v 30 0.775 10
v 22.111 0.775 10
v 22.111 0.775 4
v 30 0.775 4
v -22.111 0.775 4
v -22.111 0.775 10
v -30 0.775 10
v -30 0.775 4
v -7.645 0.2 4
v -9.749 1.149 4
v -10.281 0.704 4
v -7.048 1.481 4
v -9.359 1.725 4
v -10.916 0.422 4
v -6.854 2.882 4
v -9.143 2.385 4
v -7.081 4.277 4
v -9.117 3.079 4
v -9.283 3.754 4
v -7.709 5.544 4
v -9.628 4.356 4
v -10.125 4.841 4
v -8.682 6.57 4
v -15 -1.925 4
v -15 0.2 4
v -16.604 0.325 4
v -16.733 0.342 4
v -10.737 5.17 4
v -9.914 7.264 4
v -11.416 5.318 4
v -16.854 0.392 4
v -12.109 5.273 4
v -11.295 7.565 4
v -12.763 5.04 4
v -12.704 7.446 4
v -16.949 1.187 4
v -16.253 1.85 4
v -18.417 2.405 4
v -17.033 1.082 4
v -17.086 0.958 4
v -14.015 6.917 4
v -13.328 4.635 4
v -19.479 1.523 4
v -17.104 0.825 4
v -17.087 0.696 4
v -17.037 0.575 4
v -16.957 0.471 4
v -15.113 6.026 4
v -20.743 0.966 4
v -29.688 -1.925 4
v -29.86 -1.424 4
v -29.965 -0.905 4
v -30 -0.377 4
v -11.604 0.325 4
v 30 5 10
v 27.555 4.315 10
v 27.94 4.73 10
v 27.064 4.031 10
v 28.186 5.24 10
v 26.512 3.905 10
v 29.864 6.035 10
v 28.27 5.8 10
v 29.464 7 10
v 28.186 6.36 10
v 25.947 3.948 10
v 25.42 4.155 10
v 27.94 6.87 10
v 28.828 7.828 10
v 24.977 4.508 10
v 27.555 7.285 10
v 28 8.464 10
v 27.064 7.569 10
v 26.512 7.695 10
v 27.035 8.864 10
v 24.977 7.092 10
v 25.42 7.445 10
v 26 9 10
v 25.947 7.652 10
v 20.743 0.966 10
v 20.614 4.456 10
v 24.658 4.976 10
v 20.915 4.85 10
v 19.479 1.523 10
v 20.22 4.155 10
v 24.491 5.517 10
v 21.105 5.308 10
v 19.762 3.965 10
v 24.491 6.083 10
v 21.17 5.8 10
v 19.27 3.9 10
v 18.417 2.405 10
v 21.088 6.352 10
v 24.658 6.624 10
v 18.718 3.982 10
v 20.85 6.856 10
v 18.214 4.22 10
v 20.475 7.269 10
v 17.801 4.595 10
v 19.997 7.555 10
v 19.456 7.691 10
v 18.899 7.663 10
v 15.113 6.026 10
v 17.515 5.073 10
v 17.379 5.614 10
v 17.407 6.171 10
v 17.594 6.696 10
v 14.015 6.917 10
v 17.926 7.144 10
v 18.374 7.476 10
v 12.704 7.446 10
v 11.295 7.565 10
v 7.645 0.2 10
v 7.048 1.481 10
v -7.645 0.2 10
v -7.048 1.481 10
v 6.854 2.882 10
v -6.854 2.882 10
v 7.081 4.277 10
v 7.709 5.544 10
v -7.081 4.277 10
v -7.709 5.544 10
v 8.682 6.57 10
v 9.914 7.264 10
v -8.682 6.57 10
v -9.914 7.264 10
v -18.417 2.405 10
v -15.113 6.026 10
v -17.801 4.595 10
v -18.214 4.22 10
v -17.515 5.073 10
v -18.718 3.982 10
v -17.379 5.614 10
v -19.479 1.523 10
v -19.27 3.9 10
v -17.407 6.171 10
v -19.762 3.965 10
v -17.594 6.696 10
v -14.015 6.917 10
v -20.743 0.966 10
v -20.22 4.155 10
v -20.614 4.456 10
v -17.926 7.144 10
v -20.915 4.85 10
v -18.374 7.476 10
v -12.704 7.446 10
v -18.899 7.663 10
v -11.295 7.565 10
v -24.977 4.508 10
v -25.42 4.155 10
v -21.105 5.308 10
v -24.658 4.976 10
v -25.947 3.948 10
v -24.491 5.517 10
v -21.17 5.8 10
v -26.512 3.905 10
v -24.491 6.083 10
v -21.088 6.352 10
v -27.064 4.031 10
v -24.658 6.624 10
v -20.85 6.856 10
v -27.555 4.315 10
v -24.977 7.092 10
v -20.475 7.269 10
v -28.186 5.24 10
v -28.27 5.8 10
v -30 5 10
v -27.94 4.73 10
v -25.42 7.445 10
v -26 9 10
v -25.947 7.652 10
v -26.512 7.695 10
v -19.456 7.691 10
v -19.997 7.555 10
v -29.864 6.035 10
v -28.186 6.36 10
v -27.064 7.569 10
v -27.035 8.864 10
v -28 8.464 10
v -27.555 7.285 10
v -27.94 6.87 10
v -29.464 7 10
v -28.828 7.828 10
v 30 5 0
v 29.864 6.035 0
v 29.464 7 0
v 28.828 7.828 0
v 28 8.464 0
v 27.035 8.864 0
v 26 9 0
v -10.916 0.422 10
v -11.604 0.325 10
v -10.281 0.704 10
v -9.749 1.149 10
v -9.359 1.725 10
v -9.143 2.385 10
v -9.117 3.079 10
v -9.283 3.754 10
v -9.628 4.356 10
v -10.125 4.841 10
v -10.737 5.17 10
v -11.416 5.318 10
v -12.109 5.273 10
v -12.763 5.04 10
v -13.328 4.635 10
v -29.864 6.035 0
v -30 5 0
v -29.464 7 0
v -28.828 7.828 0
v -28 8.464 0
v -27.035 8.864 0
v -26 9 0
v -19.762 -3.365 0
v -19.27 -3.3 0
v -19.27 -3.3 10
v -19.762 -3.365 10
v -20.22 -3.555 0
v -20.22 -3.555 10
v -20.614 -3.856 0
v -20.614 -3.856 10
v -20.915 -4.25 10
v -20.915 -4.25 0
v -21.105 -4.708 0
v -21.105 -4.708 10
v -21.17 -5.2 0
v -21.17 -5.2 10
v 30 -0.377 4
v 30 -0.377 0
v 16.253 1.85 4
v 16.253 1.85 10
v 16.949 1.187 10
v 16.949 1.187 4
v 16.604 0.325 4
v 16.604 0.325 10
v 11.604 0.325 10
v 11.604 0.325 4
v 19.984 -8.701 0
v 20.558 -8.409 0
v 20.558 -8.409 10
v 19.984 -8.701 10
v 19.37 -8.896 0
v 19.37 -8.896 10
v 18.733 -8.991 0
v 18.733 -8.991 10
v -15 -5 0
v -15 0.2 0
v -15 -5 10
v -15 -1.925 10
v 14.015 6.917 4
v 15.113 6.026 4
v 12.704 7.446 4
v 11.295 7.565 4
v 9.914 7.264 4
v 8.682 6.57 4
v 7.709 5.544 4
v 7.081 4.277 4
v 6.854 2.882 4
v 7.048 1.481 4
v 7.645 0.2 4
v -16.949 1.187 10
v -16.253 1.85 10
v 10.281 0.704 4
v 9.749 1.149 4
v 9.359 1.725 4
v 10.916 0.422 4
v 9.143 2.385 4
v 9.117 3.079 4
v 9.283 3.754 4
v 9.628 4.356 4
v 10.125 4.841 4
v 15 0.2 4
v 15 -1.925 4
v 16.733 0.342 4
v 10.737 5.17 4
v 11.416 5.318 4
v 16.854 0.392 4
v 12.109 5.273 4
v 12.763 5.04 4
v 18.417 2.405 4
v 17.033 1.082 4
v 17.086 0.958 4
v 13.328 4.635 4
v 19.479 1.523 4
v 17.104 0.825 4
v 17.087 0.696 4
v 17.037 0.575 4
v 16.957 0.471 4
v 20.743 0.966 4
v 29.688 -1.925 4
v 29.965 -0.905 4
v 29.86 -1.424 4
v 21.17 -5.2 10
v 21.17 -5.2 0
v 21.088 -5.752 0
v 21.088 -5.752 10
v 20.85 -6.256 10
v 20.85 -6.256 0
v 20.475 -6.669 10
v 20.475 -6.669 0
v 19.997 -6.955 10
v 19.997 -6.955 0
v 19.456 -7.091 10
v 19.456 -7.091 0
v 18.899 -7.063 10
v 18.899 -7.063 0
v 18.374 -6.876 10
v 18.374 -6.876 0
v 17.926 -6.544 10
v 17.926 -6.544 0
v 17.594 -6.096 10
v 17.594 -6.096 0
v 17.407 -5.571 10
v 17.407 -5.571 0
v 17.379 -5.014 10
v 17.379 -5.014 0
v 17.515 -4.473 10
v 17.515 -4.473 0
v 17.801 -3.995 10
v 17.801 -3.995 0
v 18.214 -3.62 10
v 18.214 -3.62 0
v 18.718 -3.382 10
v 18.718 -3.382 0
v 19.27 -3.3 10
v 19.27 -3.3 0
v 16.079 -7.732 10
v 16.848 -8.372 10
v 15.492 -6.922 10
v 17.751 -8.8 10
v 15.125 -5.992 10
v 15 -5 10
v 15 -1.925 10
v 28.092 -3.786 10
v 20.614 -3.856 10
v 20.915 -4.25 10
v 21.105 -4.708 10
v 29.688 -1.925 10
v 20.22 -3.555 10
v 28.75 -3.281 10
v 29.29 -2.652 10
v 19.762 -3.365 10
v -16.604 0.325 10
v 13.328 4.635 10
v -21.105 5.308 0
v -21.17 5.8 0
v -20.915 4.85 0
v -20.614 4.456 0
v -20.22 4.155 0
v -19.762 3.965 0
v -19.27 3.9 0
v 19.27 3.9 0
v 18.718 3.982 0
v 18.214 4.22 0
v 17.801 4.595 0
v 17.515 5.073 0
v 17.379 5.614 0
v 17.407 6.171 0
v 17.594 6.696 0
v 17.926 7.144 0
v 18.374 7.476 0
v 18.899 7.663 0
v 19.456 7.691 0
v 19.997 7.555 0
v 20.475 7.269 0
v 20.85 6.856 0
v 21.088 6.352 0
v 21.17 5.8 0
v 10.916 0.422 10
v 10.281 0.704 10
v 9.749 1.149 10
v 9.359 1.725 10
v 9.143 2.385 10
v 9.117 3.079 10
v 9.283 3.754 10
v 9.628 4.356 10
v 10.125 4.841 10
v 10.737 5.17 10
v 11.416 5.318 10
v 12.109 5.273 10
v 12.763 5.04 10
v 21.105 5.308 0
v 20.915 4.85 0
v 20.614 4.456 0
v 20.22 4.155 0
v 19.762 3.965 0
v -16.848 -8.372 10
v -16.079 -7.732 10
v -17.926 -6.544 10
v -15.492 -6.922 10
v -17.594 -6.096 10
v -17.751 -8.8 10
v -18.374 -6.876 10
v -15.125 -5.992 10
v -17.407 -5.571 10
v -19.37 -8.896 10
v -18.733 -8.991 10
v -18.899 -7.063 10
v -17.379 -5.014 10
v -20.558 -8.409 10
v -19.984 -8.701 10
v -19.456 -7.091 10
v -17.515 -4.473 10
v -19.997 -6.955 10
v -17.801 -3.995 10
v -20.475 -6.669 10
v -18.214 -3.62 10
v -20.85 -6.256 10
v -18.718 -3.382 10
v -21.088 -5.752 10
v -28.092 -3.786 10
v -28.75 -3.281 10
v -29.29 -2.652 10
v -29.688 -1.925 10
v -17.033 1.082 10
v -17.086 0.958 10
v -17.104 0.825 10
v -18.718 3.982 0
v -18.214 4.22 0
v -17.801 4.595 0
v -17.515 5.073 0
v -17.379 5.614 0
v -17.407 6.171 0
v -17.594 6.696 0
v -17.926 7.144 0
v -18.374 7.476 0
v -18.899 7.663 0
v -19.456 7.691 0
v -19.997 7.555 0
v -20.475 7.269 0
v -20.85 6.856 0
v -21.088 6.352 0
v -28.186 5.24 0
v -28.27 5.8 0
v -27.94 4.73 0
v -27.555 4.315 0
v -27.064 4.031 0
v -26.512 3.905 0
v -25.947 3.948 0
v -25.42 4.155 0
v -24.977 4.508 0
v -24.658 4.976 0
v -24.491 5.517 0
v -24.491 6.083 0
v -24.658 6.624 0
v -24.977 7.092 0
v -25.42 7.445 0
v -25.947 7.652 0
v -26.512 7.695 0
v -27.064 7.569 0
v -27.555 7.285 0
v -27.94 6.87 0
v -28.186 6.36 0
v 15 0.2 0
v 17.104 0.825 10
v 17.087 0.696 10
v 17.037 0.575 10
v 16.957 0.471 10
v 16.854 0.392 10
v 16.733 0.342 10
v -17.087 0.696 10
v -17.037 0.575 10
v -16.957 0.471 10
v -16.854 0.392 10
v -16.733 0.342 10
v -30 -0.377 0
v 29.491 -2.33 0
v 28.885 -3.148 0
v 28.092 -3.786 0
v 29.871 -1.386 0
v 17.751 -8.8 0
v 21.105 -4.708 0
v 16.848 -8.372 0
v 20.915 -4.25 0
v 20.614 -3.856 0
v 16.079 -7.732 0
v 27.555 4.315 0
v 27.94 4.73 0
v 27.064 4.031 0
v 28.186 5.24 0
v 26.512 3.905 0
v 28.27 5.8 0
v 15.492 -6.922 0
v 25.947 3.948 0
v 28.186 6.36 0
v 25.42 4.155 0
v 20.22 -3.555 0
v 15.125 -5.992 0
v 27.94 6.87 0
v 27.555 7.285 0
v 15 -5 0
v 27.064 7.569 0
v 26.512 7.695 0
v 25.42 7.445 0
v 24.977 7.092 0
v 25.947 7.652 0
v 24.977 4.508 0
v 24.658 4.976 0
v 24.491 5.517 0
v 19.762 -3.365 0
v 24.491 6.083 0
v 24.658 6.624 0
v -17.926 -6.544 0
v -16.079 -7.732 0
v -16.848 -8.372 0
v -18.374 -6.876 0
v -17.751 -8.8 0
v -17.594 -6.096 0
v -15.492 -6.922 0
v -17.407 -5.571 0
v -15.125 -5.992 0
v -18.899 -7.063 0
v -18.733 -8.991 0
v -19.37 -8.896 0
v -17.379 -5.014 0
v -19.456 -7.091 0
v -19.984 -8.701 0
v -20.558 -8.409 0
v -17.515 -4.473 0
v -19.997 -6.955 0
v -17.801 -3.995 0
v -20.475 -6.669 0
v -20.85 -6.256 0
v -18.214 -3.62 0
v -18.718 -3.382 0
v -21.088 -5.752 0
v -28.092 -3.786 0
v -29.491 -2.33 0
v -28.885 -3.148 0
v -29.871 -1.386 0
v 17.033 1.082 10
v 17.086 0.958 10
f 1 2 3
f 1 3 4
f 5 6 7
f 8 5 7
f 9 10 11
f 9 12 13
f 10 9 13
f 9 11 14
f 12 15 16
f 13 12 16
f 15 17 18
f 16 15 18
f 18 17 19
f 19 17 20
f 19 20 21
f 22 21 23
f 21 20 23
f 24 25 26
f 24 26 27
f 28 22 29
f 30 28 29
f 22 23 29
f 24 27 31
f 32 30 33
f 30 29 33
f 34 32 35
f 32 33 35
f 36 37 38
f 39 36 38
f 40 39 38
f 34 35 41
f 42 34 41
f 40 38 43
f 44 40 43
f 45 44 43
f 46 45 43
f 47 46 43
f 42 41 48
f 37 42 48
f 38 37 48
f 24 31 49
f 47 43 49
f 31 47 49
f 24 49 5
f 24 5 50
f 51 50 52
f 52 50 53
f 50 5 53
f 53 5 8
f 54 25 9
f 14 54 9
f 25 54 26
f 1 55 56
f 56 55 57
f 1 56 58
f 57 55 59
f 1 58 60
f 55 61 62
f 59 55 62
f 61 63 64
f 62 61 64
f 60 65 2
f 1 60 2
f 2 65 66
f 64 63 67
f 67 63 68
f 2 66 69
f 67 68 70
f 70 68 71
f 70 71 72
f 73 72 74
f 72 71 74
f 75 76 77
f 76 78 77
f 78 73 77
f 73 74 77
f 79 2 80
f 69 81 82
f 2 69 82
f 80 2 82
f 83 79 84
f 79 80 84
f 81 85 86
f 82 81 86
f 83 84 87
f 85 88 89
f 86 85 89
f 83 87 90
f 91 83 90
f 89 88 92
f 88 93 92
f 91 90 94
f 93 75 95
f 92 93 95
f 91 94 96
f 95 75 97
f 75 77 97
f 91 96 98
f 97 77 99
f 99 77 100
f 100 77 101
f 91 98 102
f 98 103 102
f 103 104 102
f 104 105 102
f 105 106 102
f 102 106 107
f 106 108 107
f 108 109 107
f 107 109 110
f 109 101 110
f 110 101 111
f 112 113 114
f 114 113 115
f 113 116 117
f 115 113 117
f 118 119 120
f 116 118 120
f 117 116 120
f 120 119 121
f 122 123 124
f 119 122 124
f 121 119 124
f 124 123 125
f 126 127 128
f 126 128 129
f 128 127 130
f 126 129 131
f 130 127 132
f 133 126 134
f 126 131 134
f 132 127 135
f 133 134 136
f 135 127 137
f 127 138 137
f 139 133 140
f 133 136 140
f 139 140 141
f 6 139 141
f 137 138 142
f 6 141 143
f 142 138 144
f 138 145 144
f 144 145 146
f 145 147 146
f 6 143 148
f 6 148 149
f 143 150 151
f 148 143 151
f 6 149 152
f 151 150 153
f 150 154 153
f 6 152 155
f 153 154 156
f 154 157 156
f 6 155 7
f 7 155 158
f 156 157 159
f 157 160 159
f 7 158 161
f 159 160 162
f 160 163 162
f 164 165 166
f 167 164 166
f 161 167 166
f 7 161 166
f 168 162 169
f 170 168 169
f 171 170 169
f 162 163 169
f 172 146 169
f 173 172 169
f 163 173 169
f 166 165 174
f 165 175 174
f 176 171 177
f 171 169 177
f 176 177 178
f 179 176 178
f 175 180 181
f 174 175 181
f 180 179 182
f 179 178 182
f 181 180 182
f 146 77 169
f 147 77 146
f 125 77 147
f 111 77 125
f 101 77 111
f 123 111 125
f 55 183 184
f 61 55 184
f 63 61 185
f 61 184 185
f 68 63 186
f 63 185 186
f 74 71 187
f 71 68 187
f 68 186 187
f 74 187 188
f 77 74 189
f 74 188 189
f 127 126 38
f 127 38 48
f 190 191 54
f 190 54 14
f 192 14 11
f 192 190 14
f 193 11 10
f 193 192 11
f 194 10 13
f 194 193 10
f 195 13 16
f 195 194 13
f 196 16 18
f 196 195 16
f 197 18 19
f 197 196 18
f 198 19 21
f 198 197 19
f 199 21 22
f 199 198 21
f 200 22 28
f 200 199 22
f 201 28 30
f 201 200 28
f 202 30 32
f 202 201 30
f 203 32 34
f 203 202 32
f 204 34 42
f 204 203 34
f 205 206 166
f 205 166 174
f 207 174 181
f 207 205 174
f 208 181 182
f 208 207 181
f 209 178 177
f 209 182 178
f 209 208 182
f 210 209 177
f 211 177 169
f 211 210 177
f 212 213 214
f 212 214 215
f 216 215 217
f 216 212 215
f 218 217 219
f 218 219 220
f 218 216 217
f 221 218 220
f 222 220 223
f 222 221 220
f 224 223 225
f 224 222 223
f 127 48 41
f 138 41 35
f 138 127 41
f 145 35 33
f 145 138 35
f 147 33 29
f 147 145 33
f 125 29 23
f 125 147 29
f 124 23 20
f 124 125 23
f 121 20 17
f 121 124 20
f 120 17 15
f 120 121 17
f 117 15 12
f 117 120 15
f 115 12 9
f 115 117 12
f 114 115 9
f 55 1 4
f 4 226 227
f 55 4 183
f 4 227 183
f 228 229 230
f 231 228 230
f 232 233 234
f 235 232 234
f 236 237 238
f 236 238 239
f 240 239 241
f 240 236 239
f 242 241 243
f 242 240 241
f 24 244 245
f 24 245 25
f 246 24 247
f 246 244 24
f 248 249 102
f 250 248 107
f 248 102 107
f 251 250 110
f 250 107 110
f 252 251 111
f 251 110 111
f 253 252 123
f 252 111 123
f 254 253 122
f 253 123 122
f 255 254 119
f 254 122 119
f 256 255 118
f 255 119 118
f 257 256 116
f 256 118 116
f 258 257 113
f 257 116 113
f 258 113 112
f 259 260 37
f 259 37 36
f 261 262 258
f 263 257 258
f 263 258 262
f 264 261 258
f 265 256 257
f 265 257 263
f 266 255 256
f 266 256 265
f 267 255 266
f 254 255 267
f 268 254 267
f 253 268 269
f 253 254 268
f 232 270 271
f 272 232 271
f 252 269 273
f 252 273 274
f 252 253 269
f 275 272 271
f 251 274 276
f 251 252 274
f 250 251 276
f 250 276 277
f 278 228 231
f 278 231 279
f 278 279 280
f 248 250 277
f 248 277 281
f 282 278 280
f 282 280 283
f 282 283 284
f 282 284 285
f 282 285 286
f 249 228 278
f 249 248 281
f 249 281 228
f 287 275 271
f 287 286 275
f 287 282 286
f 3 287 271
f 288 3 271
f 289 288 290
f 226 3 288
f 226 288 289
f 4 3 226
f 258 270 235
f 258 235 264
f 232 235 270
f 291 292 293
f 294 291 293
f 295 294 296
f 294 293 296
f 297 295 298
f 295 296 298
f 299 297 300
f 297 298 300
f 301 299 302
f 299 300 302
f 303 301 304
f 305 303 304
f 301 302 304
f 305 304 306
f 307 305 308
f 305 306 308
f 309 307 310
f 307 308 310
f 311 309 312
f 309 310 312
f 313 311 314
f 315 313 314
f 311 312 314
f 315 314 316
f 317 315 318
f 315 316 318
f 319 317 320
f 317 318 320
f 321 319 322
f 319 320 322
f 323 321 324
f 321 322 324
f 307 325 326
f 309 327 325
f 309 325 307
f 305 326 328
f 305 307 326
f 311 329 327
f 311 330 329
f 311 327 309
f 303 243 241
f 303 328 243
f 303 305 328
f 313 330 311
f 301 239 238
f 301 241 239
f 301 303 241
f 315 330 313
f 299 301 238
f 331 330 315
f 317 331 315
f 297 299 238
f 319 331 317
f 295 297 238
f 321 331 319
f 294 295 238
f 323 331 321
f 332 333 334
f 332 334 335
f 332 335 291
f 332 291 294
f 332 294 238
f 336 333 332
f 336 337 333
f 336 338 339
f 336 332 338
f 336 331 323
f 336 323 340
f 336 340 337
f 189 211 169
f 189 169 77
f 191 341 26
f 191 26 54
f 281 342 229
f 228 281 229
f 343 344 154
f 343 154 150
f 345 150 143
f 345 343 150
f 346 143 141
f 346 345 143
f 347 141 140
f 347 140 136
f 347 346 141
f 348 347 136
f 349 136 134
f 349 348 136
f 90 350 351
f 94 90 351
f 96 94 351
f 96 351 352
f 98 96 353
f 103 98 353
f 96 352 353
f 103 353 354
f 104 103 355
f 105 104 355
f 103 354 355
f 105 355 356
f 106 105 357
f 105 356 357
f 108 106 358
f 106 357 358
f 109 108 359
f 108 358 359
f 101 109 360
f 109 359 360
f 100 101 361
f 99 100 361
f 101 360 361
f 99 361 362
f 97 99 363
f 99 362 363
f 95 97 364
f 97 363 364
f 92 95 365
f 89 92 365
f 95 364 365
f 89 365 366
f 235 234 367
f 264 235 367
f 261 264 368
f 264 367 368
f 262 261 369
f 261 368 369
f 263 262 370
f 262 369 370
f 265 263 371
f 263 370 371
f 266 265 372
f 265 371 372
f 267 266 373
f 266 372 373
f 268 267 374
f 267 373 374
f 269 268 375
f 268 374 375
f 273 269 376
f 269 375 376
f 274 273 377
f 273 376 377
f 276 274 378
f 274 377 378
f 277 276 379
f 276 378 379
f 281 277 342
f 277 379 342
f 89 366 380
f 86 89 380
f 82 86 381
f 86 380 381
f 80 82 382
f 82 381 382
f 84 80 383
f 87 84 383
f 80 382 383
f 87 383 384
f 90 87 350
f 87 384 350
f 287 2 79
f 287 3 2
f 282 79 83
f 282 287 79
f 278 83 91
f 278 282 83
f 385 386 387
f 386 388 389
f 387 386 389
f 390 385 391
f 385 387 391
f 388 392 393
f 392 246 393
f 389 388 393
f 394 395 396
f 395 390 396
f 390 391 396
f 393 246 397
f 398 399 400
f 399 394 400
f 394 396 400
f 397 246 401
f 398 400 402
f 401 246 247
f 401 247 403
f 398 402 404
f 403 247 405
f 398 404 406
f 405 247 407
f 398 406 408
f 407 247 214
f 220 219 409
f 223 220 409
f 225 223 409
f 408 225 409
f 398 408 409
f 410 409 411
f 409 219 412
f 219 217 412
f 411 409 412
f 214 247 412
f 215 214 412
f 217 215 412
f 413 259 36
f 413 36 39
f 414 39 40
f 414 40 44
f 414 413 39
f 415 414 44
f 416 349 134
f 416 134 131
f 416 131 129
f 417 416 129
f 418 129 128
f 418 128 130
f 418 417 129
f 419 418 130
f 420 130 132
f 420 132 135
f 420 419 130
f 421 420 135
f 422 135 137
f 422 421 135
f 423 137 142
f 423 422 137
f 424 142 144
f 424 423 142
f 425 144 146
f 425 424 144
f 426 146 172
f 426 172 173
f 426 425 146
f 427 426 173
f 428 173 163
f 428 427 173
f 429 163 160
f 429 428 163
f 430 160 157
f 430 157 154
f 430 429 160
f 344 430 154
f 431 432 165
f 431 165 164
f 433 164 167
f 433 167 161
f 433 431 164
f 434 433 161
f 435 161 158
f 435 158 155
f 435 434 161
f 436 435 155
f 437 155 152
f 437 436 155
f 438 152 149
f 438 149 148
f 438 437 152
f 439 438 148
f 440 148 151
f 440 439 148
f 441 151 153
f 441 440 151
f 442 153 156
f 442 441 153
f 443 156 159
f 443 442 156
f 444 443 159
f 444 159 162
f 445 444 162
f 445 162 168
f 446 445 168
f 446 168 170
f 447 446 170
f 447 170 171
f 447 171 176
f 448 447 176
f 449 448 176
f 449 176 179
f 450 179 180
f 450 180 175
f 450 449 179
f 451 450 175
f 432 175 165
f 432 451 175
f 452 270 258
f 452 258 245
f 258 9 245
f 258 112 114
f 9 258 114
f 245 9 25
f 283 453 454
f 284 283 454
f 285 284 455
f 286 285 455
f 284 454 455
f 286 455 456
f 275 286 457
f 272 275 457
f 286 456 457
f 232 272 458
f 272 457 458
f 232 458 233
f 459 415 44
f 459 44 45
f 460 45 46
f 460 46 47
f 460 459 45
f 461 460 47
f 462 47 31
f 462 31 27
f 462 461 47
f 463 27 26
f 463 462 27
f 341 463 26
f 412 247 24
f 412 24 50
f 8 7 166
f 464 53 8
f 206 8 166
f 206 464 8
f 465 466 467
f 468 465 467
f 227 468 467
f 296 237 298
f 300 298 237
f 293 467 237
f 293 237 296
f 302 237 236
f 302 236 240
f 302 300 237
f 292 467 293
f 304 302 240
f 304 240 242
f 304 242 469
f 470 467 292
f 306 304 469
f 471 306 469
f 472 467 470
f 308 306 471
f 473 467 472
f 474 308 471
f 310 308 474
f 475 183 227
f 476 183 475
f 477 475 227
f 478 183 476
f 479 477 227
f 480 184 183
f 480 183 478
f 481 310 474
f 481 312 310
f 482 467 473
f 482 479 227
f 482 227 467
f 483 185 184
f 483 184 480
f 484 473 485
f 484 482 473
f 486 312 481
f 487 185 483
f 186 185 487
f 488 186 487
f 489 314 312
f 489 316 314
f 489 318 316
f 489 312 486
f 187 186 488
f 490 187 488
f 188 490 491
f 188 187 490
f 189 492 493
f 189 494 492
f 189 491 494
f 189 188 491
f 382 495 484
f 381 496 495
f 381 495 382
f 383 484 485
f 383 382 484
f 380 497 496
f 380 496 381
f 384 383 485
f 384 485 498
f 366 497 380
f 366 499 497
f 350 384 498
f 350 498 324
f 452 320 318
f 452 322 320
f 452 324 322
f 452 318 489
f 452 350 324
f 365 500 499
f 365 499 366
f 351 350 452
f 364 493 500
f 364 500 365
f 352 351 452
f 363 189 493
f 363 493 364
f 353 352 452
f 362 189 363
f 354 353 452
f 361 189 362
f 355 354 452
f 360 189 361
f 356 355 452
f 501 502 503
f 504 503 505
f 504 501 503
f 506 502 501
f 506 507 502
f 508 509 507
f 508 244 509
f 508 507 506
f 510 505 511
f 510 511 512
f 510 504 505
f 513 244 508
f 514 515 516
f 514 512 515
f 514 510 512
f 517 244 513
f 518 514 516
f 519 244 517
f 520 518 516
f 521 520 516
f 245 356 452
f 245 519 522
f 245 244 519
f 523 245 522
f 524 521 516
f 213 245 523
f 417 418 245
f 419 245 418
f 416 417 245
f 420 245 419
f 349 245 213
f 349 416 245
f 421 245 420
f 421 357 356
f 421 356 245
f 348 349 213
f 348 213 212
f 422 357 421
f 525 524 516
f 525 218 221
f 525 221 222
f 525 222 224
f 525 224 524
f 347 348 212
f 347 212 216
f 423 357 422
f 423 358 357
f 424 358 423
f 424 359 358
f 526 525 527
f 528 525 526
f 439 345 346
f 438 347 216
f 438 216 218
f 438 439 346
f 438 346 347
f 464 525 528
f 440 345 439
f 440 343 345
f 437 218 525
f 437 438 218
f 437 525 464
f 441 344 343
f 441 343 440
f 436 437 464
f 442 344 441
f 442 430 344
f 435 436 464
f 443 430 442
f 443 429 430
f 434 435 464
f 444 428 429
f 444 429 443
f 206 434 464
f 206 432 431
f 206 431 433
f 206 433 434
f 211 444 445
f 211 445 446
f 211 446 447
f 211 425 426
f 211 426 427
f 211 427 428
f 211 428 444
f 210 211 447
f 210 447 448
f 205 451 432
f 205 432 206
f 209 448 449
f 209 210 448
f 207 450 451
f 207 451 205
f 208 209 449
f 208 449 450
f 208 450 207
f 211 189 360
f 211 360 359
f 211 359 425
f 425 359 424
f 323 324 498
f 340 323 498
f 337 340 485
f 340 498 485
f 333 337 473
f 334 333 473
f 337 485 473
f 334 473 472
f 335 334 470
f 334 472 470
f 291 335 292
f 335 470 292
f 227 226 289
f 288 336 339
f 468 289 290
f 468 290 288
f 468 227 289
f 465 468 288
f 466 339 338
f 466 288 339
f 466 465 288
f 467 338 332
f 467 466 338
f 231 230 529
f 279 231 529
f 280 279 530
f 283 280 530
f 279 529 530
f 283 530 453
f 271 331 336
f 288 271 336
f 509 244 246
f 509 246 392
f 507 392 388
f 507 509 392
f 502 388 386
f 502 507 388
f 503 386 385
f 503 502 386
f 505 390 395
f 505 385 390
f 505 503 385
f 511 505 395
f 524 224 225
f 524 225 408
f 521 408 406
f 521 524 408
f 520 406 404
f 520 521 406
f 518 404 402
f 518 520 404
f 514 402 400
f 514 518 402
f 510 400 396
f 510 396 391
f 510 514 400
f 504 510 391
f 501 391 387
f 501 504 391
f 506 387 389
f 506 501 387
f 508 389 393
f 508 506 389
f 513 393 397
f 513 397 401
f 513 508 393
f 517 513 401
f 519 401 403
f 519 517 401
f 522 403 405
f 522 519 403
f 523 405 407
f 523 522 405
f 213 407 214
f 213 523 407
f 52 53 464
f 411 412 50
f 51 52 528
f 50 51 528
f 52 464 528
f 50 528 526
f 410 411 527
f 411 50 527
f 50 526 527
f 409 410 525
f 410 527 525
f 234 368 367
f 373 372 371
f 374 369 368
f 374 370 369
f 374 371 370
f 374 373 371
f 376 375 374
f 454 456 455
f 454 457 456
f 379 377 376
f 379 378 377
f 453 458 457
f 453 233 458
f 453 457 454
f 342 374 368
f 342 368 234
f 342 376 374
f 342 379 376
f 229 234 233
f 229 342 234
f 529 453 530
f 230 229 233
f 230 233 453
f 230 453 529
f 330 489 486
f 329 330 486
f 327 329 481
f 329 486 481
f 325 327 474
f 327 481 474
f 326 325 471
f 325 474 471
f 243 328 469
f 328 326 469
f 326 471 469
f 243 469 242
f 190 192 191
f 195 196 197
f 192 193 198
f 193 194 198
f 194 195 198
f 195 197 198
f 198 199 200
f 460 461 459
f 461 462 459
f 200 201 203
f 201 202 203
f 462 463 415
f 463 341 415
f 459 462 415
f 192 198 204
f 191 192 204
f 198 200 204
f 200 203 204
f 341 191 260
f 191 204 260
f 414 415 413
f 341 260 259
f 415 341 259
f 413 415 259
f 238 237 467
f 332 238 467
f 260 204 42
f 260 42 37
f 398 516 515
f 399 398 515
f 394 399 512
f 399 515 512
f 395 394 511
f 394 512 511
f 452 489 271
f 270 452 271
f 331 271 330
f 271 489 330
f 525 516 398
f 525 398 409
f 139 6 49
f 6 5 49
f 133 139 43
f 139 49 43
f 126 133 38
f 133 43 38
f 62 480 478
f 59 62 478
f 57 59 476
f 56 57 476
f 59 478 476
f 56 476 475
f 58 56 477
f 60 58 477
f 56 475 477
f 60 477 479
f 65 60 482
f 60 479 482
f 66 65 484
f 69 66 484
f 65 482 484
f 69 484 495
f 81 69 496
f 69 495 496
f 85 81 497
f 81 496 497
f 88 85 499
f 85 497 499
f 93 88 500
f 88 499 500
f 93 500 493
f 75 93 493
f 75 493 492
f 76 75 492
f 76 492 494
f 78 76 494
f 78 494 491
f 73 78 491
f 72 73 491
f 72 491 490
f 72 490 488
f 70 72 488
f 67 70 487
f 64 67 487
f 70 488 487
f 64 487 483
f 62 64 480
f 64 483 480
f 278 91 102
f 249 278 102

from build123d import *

# Parameters (mm, degrees)
F1_DEPTH    = 10
F2_W        = 10.0960650777
F2_H        = 2.7
F3_DEPTH    = 6
F4_R        = 5
F5_T1_DEPTH = 21.1923143391
F5_T3_DEPTH = 15.6473434867
F5_T5_DEPTH = 30
F7_DEPTH    = 2


# Not quite as in the source:
# - a fillet or chamfer that OpenCascade refuses, or shapes differently, is made with other operations: its cross-section is extruded or revolved along the edge and cut away or added


with BuildPart() as f1:
    # F0 (on Top) → F1 (new body)
    with BuildSketch(Plane.XY):
        Polygon((30, 9), (0, 9), (0, -1.8), (15, -1.8), (15, -9), (19.5954625243, -9), (30, -2.6151265483), align=None)
        with BuildLine():
            ThreePointArc((21.17, -5.2), (17.9264971157, -6.5435028843), (19.27, -3.3))
            ThreePointArc((19.27, -3.3), (20.6135028843, -3.8564971157), (21.17, -5.2))
        make_face(mode=Mode.SUBTRACT)
        with BuildLine():
            ThreePointArc((19.27, 3.9), (17.9264971157, 7.1435028843), (21.17, 5.8))
            ThreePointArc((21.17, 5.8), (20.6135028843, 4.4564971157), (19.27, 3.9))
        make_face(mode=Mode.SUBTRACT)
        with BuildLine():
            ThreePointArc((24.47, 5.8), (26.37, 7.7), (28.27, 5.8))
            ThreePointArc((28.27, 5.8), (26.37, 3.9), (24.47, 5.8))
        make_face(mode=Mode.SUBTRACT)
    extrude(amount=F1_DEPTH)

    # F2 (on face) → F3 (cut)
    with BuildSketch(Plane.XY.offset(10)):
        with BuildLine():
            ThreePointArc((11.6039349223, 0.3250306588), (9.2827431951, 3.7535073497), (13.3280728534, 4.6353754864))
            Line((13.3280728534, 4.6353754864), (16.2527744297, 1.8499454137))
            ThreePointArc((16.2527744297, 1.8499454137), (16.328577113, 2.3348713274), (16.3539349223, 2.8250306588))
            ThreePointArc((16.3539349223, 2.8250306588), (16.0328522645, 4.5417691876), (15.1130123218, 6.0264172029))
            ThreePointArc((15.1130123218, 6.0264172029), (7.5069370658, 5.2285923001), (10.5215341623, -1.8))
            Line((10.5215341623, -1.8), (12.6863356823, -1.8))
            ThreePointArc((12.6863356823, -1.8), (14.376262754, -1.0320016711), (15.6428085277, 0.3250306588))
            Line((15.6428085277, 0.3250306588), (11.6039349223, 0.3250306588))
        make_face()
        with BuildLine():
            ThreePointArc((16.3539349223, 2.8250306588), (16.328577113, 2.3348713274), (16.2527744297, 1.8499454137))
            Line((16.2527744297, 1.8499454137), (16.9487625085, 1.1870996243))
            ThreePointArc((16.9487625085, 1.1870996243), (17.0635074373, 1.0219903081), (17.1039349223, 0.8250306588))
            ThreePointArc((17.1039349223, 0.8250306588), (16.9574883129, 0.4714772682), (16.6039349223, 0.3250306588))
            Line((16.6039349223, 0.3250306588), (15.6428085277, 0.3250306588))
            ThreePointArc((15.6428085277, 0.3250306588), (14.376262754, -1.0320016711), (12.6863356823, -1.8))
            Line((12.6863356823, -1.8), (15, -1.8))
            Line((15, -1.8), (15, -1.9249693412))
            Line((15, -1.9249693412), (19.9039349223, -1.9249693412))
            Line((19.9039349223, -1.9249693412), (19.9039349223, 0.7750306588))
            Line((19.9039349223, 0.7750306588), (15.1130123218, 6.0264172029))
            ThreePointArc((15.1130123218, 6.0264172029), (16.0328522645, 4.5417691876), (16.3539349223, 2.8250306588))
        make_face()
        with Locations((24.9519674612, -0.5749693412)):
            Rectangle(F2_W, F2_H)
    extrude(amount=-F3_DEPTH, mode=Mode.SUBTRACT)

    # F4
    f4_edges = [f1.edges().sort_by_distance(p)[0] for p in [
        (19.903935, 0.775031, 7),
    ]]
    fillet(f4_edges, radius=F4_R)

    # F5: fillet of radius 4 on 4 edges, made by hand

    # F5_s2 → F5_t1 (cut)
    with BuildSketch(Plane.XY.offset(-5.5961571696)):
        with BuildLine():
            ThreePointArc((30, -0.3766636805), (29.4905957559, -2.3300559271), (28.0921293656, -3.7859150232))
            Line((28.0921293656, -3.7859150232), (30, -2.6151265483))
            Line((30, -2.6151265483), (30, -0.3766636805))
        make_face()
    extrude(amount=F5_T1_DEPTH, mode=Mode.SUBTRACT)

    # F5_s4 → F5_t3 (cut)
    with BuildSketch(Plane.XY.offset(-2.8236717433)):
        with BuildLine():
            ThreePointArc((20.5581231925, -8.4092513427), (19.5529608525, -8.8494808332), (18.465993827, -9))
            Line((18.465993827, -9), (19.5954625243, -9))
            Line((19.5954625243, -9), (20.5581231925, -8.4092513427))
        make_face()
    extrude(amount=F5_T3_DEPTH, mode=Mode.SUBTRACT)

    # F5_s6 → F5_t5 (cut)
    with BuildSketch(Plane.XY.offset(-10)):
        with BuildLine():
            ThreePointArc((15, -5), (16.1715728753, -7.8284271247), (19, -9))
            Line((19, -9), (15, -9))
            Line((15, -9), (15, -5))
        make_face()
        with BuildLine():
            ThreePointArc((30, 5), (28.8284271247, 7.8284271247), (26, 9))
            Line((26, 9), (30, 9))
            Line((30, 9), (30, 5))
        make_face()
    extrude(amount=F5_T5_DEPTH, mode=Mode.SUBTRACT)

    # F6 (on face) → F7 (cut)
    with BuildSketch(Plane.XZ.offset(1.8)):
        Polygon((0, 10), (0, 0), (15, 0), (15, 4), (10.5215341623, 4), (10.5215341623, 10), align=None)
    extrude(amount=-F7_DEPTH, mode=Mode.SUBTRACT)

    # F8: F1 across plane


with BuildPart() as f1_1:
    add(f1.part)
    add(f1.part.mirror(Plane.YZ))


solid = f1_1.part
